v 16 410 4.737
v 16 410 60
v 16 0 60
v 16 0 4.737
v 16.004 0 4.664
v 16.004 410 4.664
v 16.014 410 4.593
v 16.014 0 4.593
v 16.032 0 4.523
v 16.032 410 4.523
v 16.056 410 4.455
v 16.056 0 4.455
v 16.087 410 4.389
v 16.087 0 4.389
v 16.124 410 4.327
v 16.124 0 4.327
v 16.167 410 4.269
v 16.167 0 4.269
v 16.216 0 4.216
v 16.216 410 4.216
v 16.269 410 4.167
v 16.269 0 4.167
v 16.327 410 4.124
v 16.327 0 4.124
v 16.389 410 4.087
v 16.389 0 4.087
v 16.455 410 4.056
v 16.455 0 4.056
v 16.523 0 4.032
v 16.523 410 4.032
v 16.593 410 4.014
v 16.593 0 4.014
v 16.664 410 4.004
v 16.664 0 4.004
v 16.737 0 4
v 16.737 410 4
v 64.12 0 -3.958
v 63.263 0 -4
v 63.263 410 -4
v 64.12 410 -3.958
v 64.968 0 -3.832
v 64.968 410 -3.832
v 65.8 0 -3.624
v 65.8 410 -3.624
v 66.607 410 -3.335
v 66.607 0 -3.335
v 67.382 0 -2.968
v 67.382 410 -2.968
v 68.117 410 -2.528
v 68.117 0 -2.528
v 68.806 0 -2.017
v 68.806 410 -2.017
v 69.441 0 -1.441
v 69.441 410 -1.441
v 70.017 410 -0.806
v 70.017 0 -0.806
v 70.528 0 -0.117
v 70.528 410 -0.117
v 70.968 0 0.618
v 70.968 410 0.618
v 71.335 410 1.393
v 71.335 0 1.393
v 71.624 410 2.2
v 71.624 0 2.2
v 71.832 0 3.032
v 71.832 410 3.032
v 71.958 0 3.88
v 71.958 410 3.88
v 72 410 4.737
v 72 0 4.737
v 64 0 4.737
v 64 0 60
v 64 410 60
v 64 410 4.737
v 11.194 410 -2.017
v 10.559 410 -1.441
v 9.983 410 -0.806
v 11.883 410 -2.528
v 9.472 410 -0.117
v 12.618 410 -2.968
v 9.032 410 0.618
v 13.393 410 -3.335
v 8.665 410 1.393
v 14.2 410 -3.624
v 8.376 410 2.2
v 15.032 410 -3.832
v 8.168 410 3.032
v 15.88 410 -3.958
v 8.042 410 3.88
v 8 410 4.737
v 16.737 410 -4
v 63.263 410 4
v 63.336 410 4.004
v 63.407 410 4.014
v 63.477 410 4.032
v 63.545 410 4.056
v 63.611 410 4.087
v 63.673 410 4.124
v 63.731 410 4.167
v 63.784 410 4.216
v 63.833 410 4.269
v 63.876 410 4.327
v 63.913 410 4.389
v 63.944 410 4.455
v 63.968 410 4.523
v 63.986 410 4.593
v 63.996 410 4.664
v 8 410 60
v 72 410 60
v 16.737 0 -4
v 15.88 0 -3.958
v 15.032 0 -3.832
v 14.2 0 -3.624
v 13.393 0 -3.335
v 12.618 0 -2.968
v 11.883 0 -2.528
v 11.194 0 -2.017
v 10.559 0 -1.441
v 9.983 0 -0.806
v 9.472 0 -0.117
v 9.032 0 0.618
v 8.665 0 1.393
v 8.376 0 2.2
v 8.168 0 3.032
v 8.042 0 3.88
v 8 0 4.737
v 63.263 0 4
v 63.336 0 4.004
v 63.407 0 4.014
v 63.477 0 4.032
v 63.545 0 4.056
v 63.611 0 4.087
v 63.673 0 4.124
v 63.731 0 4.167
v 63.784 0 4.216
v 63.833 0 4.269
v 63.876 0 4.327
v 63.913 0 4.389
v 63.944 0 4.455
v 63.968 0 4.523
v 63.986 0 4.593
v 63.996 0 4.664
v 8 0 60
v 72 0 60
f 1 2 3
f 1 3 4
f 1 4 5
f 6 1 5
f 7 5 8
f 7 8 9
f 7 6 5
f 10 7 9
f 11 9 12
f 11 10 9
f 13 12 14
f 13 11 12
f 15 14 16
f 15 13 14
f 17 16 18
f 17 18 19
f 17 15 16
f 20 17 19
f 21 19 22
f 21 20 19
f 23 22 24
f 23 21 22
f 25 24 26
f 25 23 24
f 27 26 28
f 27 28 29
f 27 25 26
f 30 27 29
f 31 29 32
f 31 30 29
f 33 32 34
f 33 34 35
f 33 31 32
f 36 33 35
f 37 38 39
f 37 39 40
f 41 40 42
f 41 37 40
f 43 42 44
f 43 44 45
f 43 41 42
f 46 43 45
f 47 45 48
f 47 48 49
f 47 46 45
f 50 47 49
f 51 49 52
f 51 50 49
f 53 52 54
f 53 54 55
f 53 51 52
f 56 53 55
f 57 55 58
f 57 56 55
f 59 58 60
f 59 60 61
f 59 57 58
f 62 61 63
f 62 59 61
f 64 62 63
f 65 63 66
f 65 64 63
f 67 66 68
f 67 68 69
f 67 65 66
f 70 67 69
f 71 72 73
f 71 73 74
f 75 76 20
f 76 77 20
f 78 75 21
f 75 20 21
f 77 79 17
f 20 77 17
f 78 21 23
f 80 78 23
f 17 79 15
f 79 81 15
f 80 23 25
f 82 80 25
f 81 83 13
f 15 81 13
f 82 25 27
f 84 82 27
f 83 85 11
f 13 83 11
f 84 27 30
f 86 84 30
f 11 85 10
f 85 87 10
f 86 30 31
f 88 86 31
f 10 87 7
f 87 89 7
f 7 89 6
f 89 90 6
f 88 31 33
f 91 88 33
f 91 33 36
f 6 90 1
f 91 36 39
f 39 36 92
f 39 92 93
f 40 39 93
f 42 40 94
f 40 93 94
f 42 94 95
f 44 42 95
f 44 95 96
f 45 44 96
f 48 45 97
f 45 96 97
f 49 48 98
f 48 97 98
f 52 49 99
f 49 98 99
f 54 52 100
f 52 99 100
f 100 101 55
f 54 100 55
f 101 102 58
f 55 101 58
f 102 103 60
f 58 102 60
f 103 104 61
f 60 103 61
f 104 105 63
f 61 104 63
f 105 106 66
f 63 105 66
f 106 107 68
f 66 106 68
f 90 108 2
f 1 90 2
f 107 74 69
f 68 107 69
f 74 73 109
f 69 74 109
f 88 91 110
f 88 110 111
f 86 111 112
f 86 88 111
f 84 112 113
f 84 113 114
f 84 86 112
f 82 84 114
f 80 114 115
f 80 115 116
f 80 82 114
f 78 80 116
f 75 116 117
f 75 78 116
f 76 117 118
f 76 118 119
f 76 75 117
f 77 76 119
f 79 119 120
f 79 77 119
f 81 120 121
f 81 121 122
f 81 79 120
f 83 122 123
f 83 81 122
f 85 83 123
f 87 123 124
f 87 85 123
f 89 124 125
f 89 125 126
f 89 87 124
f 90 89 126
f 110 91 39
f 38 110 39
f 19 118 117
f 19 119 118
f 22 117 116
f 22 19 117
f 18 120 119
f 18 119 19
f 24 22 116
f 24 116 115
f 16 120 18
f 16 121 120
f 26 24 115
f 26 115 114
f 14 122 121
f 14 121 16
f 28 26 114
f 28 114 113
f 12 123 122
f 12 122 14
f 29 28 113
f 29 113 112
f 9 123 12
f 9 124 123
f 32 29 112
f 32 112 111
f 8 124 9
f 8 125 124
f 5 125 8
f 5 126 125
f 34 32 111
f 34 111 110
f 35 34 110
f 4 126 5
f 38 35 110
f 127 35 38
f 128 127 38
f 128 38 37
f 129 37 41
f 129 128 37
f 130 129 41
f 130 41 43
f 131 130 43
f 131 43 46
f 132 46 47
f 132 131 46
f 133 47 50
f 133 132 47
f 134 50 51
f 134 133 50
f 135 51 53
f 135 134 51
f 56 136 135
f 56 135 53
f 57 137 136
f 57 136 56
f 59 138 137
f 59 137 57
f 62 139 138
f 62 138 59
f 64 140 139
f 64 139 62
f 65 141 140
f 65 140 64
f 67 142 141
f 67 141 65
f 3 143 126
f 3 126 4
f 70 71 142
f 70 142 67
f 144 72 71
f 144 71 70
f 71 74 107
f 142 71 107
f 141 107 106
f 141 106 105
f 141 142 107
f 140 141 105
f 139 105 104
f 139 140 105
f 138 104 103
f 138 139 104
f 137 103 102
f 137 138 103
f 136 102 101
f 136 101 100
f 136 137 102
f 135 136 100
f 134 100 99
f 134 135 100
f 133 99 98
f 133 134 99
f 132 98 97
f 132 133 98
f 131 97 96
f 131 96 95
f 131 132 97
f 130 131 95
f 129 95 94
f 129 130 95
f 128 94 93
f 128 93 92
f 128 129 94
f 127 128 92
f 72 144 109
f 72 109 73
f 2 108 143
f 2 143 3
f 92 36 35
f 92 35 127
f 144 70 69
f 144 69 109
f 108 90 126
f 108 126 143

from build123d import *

# Parameters (mm, degrees)
SM_START                           = -4
SM_BASE_FLANGE_1_OUTLINE_W         = 64
SM_BASE_FLANGE_1_OUTLINE_H         = 410
SM_BASE_FLANGE_1_DEPTH             = 8
SM_EDGE_FLANGE_1_STRIP_W           = 33.4732
SM_EDGE_FLANGE_1_STRIP_H           = 8
SM_EDGE_FLANGE_1_STRIP_CUT_DEPTH   = 410
SM_EDGE_FLANGE_1_STRIP_2_W         = 33.4732
SM_EDGE_FLANGE_1_STRIP_2_H         = 8
SM_EDGE_FLANGE_1_STRIP_CUT_2_DEPTH = 410
SM_EDGE_FLANGE_1_DEPTH             = 410
SM_EDGE_FLANGE_1_BEND_DEPTH        = 410


# Read off the part's stored shape, not the designer's step: 基体-法兰1
# Sheet-metal steps are written as plain solids
with BuildPart() as part:
    # 基体-法兰1 outline → 基体-法兰1 (new body)
    with BuildSketch(Plane.XY.offset(SM_START)):
        with Locations((40, 205)):
            Rectangle(SM_BASE_FLANGE_1_OUTLINE_W, SM_BASE_FLANGE_1_OUTLINE_H)
    extrude(amount=SM_BASE_FLANGE_1_DEPTH)

    # 边线-法兰1 strip (across the edge) → 边线-法兰1 strip cut (cut)
    with BuildSketch(Plane(origin=(8, 410, 4), x_dir=(1, 0, 0), z_dir=(0, -1, 0))):
        with Locations((-8, -4)):
            Rectangle(SM_EDGE_FLANGE_1_STRIP_W, SM_EDGE_FLANGE_1_STRIP_H)
    extrude(amount=SM_EDGE_FLANGE_1_STRIP_CUT_DEPTH, mode=Mode.SUBTRACT)

    # 边线-法兰1 strip 2 (across the edge) → 边线-法兰1 strip cut 2 (cut)
    with BuildSketch(Plane(origin=(72, 0, 4), x_dir=(-1, 0, 0), z_dir=(0, 1, 0))):
        with Locations((-8, -4)):
            Rectangle(SM_EDGE_FLANGE_1_STRIP_2_W, SM_EDGE_FLANGE_1_STRIP_2_H)
    extrude(amount=SM_EDGE_FLANGE_1_STRIP_CUT_2_DEPTH, mode=Mode.SUBTRACT)

    # 边线-法兰1 section (across the edge) → 边线-法兰1 (add)
    with BuildSketch(Plane(origin=(8, 410, 4), x_dir=(1, 0, 0), z_dir=(0, -1, 0))):
        with BuildLine():
            Line((0, 0.7366), (0, 56))
            Line((0, 56), (8, 56))
            Line((8, 56), (8, 0.7366))
            ThreePointArc((8, 0.7366), (8.215745145, 0.215745145), (8.7366, 0))
            Line((8.7366, 0), (8.7366, -8))
            ThreePointArc((8.7366, -8), (2.558890895, -5.441109105), (0, 0.7366))
        make_face()
    extrude(amount=SM_EDGE_FLANGE_1_DEPTH)

    # 边线-法兰1 section 2 (across the edge) → 边线-法兰1 bend (add)
    with BuildSketch(Plane(origin=(72, 0, 4), x_dir=(-1, 0, 0), z_dir=(0, 1, 0))):
        with BuildLine():
            Line((0, 0.7366), (0, 56))
            Line((0, 56), (8, 56))
            Line((8, 56), (8, 0.7366))
            ThreePointArc((8, 0.7366), (8.215745145, 0.215745145), (8.7366, 0))
            Line((8.7366, 0), (8.7366, -8))
            ThreePointArc((8.7366, -8), (2.558890895, -5.441109105), (0, 0.7366))
        make_face()
    extrude(amount=SM_EDGE_FLANGE_1_BEND_DEPTH)


solid = part.part
